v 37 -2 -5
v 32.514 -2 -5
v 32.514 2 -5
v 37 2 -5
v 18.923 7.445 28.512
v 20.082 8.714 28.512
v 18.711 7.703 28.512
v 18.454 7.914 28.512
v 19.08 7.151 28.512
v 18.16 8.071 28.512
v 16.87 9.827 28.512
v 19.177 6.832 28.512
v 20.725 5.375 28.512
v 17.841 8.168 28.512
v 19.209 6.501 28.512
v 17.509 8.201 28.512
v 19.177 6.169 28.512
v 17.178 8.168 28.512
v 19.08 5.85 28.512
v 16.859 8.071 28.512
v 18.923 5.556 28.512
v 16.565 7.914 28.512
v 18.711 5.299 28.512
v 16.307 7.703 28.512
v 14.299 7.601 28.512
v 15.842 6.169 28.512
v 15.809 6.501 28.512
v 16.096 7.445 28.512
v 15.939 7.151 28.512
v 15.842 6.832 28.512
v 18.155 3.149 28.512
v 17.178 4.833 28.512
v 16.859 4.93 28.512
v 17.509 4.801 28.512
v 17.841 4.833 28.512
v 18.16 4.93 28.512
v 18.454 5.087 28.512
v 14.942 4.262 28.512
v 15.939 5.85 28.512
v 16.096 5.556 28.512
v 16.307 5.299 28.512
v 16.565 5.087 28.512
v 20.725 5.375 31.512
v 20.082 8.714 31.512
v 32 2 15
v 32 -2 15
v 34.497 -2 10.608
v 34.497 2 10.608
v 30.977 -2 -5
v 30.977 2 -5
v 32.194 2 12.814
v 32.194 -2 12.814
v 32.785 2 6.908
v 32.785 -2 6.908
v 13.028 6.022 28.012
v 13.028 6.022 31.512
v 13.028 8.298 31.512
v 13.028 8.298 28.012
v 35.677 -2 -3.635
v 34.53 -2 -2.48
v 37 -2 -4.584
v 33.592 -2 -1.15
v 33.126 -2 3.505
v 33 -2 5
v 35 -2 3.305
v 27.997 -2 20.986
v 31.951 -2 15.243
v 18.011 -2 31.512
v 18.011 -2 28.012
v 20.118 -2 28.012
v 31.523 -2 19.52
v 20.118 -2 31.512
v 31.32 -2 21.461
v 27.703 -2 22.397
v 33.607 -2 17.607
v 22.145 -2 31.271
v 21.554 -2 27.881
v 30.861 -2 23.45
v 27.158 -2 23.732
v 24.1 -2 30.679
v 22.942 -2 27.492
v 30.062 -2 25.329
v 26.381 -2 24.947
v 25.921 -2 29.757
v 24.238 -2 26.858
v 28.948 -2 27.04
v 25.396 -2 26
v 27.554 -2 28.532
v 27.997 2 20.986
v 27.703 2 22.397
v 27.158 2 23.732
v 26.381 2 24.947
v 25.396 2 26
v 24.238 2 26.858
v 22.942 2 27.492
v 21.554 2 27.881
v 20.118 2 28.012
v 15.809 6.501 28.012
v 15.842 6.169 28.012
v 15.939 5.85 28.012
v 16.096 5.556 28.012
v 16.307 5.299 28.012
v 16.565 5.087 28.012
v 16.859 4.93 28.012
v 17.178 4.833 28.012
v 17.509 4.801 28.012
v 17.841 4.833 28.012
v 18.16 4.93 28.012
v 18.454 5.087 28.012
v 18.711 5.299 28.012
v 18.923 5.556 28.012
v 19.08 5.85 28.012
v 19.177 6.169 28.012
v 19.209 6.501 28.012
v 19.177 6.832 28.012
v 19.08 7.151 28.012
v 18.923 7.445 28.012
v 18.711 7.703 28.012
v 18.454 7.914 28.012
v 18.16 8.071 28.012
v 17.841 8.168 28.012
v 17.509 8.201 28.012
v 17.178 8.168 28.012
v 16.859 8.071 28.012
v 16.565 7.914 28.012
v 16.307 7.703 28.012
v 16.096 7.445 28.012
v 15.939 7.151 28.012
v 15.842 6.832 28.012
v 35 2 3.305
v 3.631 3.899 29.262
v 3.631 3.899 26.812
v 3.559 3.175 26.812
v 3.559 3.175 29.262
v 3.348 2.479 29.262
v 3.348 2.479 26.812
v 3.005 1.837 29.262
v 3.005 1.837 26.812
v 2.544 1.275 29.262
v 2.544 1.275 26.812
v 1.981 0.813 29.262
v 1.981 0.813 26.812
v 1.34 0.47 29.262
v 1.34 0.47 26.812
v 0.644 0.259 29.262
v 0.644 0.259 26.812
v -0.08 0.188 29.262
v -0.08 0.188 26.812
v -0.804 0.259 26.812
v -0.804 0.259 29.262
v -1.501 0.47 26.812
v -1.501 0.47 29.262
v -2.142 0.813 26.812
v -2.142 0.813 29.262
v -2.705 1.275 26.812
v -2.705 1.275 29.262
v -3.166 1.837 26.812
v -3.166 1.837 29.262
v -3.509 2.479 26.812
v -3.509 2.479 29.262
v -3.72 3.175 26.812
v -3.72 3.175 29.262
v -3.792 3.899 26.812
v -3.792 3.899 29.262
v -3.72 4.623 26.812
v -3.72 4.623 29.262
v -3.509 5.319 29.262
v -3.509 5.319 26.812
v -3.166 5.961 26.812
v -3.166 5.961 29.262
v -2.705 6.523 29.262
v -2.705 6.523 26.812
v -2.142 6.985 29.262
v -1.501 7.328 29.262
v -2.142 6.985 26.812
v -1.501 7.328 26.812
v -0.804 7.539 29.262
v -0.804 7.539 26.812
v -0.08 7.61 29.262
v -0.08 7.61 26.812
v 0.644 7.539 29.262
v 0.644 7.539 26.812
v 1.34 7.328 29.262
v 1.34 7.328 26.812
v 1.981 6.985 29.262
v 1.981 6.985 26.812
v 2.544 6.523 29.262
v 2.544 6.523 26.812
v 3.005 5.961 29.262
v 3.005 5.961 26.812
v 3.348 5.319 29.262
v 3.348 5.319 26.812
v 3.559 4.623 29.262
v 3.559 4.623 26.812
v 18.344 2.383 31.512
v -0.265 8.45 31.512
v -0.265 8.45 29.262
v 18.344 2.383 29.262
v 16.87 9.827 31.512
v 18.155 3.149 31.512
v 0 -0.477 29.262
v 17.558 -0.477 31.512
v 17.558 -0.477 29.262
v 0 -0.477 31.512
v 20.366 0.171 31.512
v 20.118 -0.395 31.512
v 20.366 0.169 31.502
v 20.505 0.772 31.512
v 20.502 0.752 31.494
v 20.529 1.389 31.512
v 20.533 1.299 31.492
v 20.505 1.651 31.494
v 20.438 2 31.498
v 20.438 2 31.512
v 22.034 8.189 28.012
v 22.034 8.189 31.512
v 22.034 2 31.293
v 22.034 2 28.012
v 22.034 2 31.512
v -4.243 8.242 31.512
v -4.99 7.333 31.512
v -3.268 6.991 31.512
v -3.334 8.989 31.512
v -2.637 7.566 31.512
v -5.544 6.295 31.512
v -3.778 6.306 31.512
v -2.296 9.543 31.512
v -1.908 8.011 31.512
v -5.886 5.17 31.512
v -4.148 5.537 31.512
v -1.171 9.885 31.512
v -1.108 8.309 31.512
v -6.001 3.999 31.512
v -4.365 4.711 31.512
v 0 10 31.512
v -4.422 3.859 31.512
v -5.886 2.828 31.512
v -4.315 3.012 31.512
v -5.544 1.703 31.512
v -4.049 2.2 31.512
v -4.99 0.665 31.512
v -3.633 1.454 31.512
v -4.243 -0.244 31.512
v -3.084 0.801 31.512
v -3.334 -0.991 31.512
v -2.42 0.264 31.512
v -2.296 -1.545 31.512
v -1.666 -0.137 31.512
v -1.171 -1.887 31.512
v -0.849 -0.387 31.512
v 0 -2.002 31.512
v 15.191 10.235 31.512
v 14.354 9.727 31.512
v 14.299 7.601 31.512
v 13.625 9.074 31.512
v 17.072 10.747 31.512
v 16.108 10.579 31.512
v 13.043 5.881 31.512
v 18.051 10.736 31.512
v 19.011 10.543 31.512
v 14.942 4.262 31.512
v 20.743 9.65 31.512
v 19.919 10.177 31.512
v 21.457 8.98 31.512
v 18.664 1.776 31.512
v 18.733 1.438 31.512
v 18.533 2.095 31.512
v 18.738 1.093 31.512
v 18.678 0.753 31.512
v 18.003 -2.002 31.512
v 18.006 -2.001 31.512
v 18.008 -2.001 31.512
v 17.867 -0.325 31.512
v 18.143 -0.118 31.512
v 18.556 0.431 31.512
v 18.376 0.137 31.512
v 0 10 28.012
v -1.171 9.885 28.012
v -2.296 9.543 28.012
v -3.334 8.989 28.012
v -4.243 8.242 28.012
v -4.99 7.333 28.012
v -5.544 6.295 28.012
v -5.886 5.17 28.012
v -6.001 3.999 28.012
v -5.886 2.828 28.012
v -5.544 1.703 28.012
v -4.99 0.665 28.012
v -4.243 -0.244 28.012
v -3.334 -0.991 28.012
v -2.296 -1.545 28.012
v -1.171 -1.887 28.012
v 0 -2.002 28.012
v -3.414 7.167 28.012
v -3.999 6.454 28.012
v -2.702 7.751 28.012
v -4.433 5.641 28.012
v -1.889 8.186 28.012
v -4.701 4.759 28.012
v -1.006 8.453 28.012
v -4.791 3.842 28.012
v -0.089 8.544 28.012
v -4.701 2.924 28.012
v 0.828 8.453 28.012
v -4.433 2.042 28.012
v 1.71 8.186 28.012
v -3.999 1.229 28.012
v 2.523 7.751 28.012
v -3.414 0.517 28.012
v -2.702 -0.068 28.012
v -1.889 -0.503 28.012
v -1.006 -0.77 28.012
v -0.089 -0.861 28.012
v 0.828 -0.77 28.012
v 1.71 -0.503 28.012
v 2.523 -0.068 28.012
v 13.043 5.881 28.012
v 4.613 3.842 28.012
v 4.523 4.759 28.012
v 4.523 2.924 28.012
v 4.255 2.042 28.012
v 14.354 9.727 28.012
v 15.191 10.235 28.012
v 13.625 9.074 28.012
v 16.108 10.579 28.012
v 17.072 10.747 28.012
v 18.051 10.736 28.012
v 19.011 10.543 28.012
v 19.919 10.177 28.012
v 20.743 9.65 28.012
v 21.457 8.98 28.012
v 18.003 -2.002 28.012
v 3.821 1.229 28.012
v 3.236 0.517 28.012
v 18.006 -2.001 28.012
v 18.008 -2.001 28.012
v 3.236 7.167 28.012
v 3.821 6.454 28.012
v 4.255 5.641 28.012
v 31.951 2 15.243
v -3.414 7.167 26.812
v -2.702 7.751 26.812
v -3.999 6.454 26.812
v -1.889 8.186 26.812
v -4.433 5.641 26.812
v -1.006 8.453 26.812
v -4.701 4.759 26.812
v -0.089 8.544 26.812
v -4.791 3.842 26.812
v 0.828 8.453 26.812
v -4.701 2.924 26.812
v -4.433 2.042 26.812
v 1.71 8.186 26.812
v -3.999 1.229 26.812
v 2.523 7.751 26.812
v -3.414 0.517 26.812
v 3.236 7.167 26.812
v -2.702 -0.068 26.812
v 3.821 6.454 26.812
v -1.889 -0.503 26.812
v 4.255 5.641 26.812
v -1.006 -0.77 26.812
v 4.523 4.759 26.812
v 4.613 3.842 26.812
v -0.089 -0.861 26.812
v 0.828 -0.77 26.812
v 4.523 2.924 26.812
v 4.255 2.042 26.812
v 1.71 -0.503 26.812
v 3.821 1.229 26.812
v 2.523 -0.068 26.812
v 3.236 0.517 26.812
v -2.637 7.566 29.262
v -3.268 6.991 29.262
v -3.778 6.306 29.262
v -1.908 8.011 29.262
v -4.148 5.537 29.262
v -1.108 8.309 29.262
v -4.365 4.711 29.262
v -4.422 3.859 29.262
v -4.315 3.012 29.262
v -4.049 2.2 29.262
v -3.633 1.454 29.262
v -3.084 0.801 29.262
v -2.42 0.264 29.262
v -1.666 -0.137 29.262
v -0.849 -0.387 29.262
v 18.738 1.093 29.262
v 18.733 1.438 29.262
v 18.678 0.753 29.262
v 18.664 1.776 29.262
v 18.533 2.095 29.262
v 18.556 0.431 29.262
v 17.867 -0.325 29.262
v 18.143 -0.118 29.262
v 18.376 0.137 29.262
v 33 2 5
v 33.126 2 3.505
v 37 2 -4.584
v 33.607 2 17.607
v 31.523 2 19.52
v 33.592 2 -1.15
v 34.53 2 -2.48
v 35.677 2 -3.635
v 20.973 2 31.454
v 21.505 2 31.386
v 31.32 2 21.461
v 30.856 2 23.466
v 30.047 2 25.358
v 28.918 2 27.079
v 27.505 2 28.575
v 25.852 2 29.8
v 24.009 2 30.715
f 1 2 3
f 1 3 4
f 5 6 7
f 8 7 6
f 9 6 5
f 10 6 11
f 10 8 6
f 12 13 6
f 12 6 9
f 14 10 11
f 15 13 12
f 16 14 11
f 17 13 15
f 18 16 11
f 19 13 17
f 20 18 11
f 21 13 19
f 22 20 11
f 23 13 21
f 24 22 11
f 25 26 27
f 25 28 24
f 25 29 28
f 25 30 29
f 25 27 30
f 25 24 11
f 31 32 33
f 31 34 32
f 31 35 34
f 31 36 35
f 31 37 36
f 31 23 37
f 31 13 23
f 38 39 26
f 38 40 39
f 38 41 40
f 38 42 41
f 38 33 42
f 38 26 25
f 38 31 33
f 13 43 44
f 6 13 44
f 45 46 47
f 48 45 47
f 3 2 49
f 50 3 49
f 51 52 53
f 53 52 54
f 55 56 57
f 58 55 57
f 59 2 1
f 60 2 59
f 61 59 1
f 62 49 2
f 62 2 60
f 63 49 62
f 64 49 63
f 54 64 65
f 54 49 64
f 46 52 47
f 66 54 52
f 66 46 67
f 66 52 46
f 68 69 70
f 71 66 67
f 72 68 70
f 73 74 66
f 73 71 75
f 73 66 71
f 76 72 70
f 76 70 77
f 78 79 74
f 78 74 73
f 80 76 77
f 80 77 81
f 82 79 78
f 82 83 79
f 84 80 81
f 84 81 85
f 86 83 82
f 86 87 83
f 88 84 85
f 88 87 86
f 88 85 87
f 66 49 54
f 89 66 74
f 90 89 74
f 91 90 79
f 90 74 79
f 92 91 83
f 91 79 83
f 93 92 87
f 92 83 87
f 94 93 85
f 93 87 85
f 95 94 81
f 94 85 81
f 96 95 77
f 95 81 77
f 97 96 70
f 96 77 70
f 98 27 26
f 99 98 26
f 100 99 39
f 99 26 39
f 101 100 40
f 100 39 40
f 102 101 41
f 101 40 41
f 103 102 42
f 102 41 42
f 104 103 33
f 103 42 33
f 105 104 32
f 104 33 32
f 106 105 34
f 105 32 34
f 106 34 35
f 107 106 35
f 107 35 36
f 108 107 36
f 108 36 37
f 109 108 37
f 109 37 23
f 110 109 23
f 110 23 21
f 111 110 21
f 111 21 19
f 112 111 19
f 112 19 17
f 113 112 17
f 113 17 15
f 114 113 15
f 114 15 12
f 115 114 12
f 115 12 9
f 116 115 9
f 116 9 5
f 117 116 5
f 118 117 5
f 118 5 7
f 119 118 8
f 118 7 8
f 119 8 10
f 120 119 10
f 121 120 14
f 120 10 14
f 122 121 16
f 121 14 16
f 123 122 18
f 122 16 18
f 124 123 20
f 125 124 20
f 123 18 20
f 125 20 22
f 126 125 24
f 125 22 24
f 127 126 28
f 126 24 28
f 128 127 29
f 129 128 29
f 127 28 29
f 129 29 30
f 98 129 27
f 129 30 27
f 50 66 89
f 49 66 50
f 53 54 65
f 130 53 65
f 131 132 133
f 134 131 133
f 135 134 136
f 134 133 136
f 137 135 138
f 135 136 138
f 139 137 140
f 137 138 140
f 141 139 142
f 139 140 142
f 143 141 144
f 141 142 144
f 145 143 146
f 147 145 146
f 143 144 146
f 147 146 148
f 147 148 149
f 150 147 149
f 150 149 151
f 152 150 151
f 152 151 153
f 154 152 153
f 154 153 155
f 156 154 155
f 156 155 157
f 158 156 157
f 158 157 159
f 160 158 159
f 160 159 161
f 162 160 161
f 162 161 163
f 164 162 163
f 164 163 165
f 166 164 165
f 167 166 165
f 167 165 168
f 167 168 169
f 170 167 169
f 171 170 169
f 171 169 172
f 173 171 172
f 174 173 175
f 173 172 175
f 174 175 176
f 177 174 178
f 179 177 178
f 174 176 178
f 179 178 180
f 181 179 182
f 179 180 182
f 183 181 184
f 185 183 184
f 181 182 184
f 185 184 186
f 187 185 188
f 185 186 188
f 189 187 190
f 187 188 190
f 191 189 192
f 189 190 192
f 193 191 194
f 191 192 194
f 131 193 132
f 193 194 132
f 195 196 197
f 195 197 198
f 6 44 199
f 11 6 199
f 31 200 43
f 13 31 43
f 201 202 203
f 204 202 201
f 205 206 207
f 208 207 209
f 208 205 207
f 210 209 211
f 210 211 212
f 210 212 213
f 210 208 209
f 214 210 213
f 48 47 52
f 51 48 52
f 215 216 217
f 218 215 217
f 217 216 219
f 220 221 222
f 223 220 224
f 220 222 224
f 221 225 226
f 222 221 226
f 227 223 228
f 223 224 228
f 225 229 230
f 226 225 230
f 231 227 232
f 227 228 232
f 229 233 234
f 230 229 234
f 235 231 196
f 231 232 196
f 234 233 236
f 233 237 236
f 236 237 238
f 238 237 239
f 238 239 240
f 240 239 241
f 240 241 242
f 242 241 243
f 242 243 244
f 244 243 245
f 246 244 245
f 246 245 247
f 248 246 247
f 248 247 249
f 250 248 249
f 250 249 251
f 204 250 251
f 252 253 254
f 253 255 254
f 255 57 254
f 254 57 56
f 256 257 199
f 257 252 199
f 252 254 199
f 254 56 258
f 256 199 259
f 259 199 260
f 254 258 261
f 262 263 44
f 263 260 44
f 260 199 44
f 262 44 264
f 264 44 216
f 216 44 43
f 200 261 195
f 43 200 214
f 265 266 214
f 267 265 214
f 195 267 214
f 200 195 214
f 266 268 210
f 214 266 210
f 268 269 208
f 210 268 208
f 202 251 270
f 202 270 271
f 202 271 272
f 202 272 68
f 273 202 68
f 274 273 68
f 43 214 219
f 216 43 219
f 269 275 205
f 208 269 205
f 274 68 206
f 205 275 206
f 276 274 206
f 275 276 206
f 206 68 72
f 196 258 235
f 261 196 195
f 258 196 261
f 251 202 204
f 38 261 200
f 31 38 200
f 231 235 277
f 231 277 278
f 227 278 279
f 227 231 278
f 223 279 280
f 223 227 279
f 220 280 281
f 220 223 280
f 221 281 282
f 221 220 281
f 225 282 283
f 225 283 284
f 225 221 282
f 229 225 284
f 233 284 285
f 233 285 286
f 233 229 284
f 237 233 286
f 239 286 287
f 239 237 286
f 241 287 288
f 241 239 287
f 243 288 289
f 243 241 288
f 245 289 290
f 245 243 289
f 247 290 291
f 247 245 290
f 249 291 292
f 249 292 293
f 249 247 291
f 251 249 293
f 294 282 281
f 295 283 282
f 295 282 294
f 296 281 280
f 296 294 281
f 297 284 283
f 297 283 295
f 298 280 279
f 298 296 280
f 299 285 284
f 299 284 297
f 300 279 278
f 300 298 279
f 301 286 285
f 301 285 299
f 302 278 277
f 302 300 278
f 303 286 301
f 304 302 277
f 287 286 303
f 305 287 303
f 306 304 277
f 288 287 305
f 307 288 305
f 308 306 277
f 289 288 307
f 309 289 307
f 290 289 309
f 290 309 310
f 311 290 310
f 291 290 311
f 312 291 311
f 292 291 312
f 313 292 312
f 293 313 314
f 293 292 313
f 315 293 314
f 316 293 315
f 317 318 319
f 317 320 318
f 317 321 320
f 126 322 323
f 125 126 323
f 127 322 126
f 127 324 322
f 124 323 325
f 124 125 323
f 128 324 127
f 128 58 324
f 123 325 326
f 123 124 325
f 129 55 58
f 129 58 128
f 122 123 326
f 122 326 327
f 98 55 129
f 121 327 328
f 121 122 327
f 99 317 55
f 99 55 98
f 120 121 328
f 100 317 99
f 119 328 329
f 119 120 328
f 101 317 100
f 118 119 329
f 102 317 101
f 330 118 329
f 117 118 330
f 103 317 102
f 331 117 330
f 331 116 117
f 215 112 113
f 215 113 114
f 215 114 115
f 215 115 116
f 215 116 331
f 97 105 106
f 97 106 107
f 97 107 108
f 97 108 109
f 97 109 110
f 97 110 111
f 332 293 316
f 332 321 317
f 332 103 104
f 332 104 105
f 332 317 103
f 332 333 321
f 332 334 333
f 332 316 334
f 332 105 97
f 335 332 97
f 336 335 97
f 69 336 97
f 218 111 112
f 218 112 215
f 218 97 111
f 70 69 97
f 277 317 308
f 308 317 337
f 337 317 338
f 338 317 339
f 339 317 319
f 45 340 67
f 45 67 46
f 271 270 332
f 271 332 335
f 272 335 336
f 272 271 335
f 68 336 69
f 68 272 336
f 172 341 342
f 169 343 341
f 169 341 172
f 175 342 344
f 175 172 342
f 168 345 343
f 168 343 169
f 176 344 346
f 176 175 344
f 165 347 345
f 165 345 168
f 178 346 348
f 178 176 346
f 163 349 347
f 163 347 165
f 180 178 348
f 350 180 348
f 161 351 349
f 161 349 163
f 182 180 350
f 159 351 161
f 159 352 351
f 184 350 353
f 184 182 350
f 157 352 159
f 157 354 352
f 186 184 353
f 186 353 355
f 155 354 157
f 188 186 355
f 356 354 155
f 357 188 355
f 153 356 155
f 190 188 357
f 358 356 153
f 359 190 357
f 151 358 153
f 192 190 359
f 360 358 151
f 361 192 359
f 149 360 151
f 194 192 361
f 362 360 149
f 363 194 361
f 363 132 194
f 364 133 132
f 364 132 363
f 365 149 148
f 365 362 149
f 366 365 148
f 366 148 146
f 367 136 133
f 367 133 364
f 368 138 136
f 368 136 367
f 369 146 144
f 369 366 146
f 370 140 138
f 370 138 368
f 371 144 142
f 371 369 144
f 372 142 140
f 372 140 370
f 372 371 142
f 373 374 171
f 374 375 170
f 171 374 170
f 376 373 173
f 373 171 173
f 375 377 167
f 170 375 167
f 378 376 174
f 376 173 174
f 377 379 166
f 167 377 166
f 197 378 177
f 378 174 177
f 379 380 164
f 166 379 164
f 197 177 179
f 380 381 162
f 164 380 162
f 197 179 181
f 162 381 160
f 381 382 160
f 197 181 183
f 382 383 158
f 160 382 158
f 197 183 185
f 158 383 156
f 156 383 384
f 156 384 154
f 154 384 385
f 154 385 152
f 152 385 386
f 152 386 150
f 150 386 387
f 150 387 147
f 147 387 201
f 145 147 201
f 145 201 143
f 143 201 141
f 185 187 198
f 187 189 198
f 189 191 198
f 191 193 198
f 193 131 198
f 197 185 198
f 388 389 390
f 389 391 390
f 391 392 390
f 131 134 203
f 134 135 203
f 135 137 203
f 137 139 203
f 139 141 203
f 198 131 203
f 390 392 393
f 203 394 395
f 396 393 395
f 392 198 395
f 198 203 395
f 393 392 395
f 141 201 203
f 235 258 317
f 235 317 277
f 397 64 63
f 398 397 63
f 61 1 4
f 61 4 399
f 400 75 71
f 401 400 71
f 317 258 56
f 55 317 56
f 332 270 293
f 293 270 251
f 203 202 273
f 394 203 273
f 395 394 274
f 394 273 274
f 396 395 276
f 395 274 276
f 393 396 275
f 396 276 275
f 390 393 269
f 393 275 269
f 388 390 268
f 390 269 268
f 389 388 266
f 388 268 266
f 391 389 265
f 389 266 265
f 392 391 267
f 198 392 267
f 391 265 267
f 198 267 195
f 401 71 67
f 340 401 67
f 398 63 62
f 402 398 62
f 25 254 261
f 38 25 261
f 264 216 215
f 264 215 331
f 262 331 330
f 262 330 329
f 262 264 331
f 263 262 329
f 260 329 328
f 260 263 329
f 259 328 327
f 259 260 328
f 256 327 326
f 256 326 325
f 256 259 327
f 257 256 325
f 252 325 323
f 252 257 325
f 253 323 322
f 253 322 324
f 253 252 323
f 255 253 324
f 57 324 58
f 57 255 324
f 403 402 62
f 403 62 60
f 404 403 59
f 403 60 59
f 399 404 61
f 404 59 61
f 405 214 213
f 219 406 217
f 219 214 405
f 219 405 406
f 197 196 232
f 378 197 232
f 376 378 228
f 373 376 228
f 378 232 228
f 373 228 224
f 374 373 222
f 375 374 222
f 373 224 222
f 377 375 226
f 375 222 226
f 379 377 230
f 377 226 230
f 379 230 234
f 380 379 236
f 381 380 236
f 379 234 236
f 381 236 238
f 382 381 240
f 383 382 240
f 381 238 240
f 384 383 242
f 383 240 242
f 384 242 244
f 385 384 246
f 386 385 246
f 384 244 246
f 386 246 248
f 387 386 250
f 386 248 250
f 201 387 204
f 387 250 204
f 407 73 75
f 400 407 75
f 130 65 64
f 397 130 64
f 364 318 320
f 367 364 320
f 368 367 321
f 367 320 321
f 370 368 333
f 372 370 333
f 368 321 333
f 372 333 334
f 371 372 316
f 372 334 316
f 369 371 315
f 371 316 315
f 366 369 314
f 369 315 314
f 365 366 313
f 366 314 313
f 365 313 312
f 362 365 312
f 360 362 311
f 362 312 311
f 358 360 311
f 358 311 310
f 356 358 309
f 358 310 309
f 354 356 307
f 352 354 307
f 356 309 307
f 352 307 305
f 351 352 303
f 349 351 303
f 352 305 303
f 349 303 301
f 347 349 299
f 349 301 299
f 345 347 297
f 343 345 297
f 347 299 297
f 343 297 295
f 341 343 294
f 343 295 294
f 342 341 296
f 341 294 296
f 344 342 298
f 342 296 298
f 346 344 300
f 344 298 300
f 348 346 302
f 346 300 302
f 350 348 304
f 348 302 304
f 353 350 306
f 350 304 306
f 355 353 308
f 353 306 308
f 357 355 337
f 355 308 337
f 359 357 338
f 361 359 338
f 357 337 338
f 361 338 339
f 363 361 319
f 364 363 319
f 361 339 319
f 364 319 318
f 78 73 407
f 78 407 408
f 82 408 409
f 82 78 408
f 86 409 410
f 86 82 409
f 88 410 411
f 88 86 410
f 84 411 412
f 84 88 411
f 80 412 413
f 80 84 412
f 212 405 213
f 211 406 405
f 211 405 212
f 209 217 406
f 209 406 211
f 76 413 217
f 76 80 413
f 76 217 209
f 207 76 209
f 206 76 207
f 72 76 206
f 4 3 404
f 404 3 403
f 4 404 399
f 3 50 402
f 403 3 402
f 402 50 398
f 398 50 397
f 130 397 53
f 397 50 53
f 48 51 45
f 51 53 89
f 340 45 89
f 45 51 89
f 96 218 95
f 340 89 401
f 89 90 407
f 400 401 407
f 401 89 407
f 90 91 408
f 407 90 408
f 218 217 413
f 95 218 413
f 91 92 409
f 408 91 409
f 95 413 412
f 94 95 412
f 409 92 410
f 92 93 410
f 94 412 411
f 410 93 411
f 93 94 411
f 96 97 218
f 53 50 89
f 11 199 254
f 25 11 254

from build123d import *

# Parameters (mm, degrees)
PAD007_DEPTH       = 2
PAD010_DEPTH       = 3.5
POCKET003005_DEPTH = 2.25
SKETCH016_R        = 4.702209
PAD011_DEPTH       = 1.2
SKETCH017_R        = 3.711245
POCKET003006_DEPTH = 5
PAD014_DEPTH       = 3.5
SKETCH031_R        = 1.7
POCKET003015_DEPTH = 5
PAD019_DEPTH       = 4
POCKET003038_DEPTH = 3


with BuildPart() as part:
    # Sketch010 → Pad007 (new body, symmetric)
    with BuildSketch(Plane.XZ):
        with BuildLine():
            Line((0, 28.012352), (20.118014, 28.012352))
            ThreePointArc((27.996705, 20.985645), (25.39647, 26.000475), (20.118014, 28.012352))
            Line((27.996705, 20.985645), (30.977077, -4.999855))
            Line((33.977077, -4.999855), (30.977077, -4.999855))
            Line((31.375086, 21.001563), (33.977077, -4.999855))
            ThreePointArc((31.375086, 21.001563), (27.724484, 28.375327), (20.118014, 31.512352))
            Line((0, 31.512352), (20.118014, 31.512352))
            Line((0, 28.012352), (0, 31.512352))
        make_face()
    extrude(amount=PAD007_DEPTH, both=True)

    # Sketch011 → Pad010 (new body)
    with BuildSketch(Plane(origin=(0, 0, 31.512352), x_dir=(-1, 0, 0), z_dir=(0, 0, 1))):
        with BuildLine():
            Line((-18.002971, 2.001985), (0, 2.001985))
            ThreePointArc((0, -10), (6.000993, -3.999007), (0, 2.001985))
            Line((-19, -4), (0, -10))
            ThreePointArc((-18.002971, 2.001985), (-20.489406, -0.668781), (-19, -4))
        make_face()
    extrude(amount=-PAD010_DEPTH)

    # Sketch015 → Pocket003005 (cut)
    with BuildSketch(Plane(origin=(0, 0, 31.512352), x_dir=(-1, 0, 0), z_dir=(0, 0, 1))):
        with BuildLine():
            Line((-17.557616, 0.476904), (0, 0.476904))
            ThreePointArc((0.265399, -8.449899), (4.421634, -3.858985), (0, 0.476904))
            Line((0.265399, -8.449899), (-18.344393, -2.383287))
            ThreePointArc((-17.557616, 0.476904), (-18.678345, -0.753115), (-18.344393, -2.383287))
        make_face()
    extrude(amount=-POCKET003005_DEPTH, mode=Mode.SUBTRACT)

    # Sketch016 → Pad011 (new body)
    with BuildSketch(Plane(origin=(0, 0, 28.012352), x_dir=(1, 0, 0), z_dir=(0, 0, -1))):
        with Locations((-0.089106, -3.841625)):
            Circle(SKETCH016_R)
    extrude(amount=PAD011_DEPTH)

    # Sketch017 → Pocket003006 (cut)
    with BuildSketch(Plane(origin=(0, 0, 26.812352), x_dir=(1, 0, 0), z_dir=(0, 0, -1))):
        with Locations((-0.080471, -3.899184)):
            Circle(SKETCH017_R)
    extrude(amount=-POCKET003006_DEPTH, mode=Mode.SUBTRACT)

    # Sketch022 → Pad014 (new body)
    with BuildSketch(Plane(origin=(0, 0, 31.512352), x_dir=(-1, 0, 0), z_dir=(0, 0, 1))):
        with BuildLine():
            Line((-20.438215, -2), (-13.234047, -4.102969))
            Line((-13.234047, -4.102969), (-13.028216, -6.021869))
            Line((-13.028216, -6.021869), (-13.028216, -8.298126))
            ThreePointArc((-22.034031, -8.18918), (-17.561616, -10.764285), (-13.028216, -8.298126))
            Line((-22.034031, -8.18918), (-22.034031, -2))
            Line((-20.438215, -2), (-22.034031, -2))
        make_face()
    extrude(amount=-PAD014_DEPTH)

    # Sketch031 → Pocket003015 (cut)
    with BuildSketch(Plane(origin=(0, 0, 31.512352), x_dir=(-1, 0, 0), z_dir=(0, 0, 1))):
        with Locations((-17.509254, -6.500788)):
            Circle(SKETCH031_R)
    extrude(amount=-POCKET003015_DEPTH, mode=Mode.SUBTRACT)

    # Sketch032 → Pad019 (new body)
    with BuildSketch(Plane.XZ.offset(2)):
        with BuildLine():
            Line((27, 28.536497), (32.513573, -5))
            Line((32.513573, -5), (37.000002, -5))
            Line((37.000002, -5), (37.000002, -4.583553))
            ThreePointArc((33.505627, -1), (35.019116, -3.019659), (37.000002, -4.583553))
            Line((33, 5), (33.505627, -1))
            Line((35, 3.304739), (33, 5))
            Line((32.728943, 7), (35, 3.304739))
            Line((32, 13), (32.728943, 7))
            Line((34.496559, 10.608005), (32, 13))
            Line((32, 15), (34.496559, 10.608005))
            Line((31, 20), (32, 15))
            Line((33.606815, 17.606869), (31, 20))
            Line((31, 22), (33.606815, 17.606869))
            Line((27, 28.536497), (31, 22))
        make_face()
    extrude(amount=-PAD019_DEPTH)

    # Sketch074 → Pocket003038 (cut)
    with BuildSketch(Plane(origin=(0, 0, 31.512352), x_dir=(-1, 0, 0), z_dir=(0, 0, 1))):
        Polygon((-16.869587, -9.826502), (-14.299442, -7.600665), (-14.942, -4.261935), (-18.154705, -3.149042), (-20.72485, -5.374879), (-20.082292, -8.713609), align=None)
    extrude(amount=-POCKET003038_DEPTH, mode=Mode.SUBTRACT)


solid = part.part
